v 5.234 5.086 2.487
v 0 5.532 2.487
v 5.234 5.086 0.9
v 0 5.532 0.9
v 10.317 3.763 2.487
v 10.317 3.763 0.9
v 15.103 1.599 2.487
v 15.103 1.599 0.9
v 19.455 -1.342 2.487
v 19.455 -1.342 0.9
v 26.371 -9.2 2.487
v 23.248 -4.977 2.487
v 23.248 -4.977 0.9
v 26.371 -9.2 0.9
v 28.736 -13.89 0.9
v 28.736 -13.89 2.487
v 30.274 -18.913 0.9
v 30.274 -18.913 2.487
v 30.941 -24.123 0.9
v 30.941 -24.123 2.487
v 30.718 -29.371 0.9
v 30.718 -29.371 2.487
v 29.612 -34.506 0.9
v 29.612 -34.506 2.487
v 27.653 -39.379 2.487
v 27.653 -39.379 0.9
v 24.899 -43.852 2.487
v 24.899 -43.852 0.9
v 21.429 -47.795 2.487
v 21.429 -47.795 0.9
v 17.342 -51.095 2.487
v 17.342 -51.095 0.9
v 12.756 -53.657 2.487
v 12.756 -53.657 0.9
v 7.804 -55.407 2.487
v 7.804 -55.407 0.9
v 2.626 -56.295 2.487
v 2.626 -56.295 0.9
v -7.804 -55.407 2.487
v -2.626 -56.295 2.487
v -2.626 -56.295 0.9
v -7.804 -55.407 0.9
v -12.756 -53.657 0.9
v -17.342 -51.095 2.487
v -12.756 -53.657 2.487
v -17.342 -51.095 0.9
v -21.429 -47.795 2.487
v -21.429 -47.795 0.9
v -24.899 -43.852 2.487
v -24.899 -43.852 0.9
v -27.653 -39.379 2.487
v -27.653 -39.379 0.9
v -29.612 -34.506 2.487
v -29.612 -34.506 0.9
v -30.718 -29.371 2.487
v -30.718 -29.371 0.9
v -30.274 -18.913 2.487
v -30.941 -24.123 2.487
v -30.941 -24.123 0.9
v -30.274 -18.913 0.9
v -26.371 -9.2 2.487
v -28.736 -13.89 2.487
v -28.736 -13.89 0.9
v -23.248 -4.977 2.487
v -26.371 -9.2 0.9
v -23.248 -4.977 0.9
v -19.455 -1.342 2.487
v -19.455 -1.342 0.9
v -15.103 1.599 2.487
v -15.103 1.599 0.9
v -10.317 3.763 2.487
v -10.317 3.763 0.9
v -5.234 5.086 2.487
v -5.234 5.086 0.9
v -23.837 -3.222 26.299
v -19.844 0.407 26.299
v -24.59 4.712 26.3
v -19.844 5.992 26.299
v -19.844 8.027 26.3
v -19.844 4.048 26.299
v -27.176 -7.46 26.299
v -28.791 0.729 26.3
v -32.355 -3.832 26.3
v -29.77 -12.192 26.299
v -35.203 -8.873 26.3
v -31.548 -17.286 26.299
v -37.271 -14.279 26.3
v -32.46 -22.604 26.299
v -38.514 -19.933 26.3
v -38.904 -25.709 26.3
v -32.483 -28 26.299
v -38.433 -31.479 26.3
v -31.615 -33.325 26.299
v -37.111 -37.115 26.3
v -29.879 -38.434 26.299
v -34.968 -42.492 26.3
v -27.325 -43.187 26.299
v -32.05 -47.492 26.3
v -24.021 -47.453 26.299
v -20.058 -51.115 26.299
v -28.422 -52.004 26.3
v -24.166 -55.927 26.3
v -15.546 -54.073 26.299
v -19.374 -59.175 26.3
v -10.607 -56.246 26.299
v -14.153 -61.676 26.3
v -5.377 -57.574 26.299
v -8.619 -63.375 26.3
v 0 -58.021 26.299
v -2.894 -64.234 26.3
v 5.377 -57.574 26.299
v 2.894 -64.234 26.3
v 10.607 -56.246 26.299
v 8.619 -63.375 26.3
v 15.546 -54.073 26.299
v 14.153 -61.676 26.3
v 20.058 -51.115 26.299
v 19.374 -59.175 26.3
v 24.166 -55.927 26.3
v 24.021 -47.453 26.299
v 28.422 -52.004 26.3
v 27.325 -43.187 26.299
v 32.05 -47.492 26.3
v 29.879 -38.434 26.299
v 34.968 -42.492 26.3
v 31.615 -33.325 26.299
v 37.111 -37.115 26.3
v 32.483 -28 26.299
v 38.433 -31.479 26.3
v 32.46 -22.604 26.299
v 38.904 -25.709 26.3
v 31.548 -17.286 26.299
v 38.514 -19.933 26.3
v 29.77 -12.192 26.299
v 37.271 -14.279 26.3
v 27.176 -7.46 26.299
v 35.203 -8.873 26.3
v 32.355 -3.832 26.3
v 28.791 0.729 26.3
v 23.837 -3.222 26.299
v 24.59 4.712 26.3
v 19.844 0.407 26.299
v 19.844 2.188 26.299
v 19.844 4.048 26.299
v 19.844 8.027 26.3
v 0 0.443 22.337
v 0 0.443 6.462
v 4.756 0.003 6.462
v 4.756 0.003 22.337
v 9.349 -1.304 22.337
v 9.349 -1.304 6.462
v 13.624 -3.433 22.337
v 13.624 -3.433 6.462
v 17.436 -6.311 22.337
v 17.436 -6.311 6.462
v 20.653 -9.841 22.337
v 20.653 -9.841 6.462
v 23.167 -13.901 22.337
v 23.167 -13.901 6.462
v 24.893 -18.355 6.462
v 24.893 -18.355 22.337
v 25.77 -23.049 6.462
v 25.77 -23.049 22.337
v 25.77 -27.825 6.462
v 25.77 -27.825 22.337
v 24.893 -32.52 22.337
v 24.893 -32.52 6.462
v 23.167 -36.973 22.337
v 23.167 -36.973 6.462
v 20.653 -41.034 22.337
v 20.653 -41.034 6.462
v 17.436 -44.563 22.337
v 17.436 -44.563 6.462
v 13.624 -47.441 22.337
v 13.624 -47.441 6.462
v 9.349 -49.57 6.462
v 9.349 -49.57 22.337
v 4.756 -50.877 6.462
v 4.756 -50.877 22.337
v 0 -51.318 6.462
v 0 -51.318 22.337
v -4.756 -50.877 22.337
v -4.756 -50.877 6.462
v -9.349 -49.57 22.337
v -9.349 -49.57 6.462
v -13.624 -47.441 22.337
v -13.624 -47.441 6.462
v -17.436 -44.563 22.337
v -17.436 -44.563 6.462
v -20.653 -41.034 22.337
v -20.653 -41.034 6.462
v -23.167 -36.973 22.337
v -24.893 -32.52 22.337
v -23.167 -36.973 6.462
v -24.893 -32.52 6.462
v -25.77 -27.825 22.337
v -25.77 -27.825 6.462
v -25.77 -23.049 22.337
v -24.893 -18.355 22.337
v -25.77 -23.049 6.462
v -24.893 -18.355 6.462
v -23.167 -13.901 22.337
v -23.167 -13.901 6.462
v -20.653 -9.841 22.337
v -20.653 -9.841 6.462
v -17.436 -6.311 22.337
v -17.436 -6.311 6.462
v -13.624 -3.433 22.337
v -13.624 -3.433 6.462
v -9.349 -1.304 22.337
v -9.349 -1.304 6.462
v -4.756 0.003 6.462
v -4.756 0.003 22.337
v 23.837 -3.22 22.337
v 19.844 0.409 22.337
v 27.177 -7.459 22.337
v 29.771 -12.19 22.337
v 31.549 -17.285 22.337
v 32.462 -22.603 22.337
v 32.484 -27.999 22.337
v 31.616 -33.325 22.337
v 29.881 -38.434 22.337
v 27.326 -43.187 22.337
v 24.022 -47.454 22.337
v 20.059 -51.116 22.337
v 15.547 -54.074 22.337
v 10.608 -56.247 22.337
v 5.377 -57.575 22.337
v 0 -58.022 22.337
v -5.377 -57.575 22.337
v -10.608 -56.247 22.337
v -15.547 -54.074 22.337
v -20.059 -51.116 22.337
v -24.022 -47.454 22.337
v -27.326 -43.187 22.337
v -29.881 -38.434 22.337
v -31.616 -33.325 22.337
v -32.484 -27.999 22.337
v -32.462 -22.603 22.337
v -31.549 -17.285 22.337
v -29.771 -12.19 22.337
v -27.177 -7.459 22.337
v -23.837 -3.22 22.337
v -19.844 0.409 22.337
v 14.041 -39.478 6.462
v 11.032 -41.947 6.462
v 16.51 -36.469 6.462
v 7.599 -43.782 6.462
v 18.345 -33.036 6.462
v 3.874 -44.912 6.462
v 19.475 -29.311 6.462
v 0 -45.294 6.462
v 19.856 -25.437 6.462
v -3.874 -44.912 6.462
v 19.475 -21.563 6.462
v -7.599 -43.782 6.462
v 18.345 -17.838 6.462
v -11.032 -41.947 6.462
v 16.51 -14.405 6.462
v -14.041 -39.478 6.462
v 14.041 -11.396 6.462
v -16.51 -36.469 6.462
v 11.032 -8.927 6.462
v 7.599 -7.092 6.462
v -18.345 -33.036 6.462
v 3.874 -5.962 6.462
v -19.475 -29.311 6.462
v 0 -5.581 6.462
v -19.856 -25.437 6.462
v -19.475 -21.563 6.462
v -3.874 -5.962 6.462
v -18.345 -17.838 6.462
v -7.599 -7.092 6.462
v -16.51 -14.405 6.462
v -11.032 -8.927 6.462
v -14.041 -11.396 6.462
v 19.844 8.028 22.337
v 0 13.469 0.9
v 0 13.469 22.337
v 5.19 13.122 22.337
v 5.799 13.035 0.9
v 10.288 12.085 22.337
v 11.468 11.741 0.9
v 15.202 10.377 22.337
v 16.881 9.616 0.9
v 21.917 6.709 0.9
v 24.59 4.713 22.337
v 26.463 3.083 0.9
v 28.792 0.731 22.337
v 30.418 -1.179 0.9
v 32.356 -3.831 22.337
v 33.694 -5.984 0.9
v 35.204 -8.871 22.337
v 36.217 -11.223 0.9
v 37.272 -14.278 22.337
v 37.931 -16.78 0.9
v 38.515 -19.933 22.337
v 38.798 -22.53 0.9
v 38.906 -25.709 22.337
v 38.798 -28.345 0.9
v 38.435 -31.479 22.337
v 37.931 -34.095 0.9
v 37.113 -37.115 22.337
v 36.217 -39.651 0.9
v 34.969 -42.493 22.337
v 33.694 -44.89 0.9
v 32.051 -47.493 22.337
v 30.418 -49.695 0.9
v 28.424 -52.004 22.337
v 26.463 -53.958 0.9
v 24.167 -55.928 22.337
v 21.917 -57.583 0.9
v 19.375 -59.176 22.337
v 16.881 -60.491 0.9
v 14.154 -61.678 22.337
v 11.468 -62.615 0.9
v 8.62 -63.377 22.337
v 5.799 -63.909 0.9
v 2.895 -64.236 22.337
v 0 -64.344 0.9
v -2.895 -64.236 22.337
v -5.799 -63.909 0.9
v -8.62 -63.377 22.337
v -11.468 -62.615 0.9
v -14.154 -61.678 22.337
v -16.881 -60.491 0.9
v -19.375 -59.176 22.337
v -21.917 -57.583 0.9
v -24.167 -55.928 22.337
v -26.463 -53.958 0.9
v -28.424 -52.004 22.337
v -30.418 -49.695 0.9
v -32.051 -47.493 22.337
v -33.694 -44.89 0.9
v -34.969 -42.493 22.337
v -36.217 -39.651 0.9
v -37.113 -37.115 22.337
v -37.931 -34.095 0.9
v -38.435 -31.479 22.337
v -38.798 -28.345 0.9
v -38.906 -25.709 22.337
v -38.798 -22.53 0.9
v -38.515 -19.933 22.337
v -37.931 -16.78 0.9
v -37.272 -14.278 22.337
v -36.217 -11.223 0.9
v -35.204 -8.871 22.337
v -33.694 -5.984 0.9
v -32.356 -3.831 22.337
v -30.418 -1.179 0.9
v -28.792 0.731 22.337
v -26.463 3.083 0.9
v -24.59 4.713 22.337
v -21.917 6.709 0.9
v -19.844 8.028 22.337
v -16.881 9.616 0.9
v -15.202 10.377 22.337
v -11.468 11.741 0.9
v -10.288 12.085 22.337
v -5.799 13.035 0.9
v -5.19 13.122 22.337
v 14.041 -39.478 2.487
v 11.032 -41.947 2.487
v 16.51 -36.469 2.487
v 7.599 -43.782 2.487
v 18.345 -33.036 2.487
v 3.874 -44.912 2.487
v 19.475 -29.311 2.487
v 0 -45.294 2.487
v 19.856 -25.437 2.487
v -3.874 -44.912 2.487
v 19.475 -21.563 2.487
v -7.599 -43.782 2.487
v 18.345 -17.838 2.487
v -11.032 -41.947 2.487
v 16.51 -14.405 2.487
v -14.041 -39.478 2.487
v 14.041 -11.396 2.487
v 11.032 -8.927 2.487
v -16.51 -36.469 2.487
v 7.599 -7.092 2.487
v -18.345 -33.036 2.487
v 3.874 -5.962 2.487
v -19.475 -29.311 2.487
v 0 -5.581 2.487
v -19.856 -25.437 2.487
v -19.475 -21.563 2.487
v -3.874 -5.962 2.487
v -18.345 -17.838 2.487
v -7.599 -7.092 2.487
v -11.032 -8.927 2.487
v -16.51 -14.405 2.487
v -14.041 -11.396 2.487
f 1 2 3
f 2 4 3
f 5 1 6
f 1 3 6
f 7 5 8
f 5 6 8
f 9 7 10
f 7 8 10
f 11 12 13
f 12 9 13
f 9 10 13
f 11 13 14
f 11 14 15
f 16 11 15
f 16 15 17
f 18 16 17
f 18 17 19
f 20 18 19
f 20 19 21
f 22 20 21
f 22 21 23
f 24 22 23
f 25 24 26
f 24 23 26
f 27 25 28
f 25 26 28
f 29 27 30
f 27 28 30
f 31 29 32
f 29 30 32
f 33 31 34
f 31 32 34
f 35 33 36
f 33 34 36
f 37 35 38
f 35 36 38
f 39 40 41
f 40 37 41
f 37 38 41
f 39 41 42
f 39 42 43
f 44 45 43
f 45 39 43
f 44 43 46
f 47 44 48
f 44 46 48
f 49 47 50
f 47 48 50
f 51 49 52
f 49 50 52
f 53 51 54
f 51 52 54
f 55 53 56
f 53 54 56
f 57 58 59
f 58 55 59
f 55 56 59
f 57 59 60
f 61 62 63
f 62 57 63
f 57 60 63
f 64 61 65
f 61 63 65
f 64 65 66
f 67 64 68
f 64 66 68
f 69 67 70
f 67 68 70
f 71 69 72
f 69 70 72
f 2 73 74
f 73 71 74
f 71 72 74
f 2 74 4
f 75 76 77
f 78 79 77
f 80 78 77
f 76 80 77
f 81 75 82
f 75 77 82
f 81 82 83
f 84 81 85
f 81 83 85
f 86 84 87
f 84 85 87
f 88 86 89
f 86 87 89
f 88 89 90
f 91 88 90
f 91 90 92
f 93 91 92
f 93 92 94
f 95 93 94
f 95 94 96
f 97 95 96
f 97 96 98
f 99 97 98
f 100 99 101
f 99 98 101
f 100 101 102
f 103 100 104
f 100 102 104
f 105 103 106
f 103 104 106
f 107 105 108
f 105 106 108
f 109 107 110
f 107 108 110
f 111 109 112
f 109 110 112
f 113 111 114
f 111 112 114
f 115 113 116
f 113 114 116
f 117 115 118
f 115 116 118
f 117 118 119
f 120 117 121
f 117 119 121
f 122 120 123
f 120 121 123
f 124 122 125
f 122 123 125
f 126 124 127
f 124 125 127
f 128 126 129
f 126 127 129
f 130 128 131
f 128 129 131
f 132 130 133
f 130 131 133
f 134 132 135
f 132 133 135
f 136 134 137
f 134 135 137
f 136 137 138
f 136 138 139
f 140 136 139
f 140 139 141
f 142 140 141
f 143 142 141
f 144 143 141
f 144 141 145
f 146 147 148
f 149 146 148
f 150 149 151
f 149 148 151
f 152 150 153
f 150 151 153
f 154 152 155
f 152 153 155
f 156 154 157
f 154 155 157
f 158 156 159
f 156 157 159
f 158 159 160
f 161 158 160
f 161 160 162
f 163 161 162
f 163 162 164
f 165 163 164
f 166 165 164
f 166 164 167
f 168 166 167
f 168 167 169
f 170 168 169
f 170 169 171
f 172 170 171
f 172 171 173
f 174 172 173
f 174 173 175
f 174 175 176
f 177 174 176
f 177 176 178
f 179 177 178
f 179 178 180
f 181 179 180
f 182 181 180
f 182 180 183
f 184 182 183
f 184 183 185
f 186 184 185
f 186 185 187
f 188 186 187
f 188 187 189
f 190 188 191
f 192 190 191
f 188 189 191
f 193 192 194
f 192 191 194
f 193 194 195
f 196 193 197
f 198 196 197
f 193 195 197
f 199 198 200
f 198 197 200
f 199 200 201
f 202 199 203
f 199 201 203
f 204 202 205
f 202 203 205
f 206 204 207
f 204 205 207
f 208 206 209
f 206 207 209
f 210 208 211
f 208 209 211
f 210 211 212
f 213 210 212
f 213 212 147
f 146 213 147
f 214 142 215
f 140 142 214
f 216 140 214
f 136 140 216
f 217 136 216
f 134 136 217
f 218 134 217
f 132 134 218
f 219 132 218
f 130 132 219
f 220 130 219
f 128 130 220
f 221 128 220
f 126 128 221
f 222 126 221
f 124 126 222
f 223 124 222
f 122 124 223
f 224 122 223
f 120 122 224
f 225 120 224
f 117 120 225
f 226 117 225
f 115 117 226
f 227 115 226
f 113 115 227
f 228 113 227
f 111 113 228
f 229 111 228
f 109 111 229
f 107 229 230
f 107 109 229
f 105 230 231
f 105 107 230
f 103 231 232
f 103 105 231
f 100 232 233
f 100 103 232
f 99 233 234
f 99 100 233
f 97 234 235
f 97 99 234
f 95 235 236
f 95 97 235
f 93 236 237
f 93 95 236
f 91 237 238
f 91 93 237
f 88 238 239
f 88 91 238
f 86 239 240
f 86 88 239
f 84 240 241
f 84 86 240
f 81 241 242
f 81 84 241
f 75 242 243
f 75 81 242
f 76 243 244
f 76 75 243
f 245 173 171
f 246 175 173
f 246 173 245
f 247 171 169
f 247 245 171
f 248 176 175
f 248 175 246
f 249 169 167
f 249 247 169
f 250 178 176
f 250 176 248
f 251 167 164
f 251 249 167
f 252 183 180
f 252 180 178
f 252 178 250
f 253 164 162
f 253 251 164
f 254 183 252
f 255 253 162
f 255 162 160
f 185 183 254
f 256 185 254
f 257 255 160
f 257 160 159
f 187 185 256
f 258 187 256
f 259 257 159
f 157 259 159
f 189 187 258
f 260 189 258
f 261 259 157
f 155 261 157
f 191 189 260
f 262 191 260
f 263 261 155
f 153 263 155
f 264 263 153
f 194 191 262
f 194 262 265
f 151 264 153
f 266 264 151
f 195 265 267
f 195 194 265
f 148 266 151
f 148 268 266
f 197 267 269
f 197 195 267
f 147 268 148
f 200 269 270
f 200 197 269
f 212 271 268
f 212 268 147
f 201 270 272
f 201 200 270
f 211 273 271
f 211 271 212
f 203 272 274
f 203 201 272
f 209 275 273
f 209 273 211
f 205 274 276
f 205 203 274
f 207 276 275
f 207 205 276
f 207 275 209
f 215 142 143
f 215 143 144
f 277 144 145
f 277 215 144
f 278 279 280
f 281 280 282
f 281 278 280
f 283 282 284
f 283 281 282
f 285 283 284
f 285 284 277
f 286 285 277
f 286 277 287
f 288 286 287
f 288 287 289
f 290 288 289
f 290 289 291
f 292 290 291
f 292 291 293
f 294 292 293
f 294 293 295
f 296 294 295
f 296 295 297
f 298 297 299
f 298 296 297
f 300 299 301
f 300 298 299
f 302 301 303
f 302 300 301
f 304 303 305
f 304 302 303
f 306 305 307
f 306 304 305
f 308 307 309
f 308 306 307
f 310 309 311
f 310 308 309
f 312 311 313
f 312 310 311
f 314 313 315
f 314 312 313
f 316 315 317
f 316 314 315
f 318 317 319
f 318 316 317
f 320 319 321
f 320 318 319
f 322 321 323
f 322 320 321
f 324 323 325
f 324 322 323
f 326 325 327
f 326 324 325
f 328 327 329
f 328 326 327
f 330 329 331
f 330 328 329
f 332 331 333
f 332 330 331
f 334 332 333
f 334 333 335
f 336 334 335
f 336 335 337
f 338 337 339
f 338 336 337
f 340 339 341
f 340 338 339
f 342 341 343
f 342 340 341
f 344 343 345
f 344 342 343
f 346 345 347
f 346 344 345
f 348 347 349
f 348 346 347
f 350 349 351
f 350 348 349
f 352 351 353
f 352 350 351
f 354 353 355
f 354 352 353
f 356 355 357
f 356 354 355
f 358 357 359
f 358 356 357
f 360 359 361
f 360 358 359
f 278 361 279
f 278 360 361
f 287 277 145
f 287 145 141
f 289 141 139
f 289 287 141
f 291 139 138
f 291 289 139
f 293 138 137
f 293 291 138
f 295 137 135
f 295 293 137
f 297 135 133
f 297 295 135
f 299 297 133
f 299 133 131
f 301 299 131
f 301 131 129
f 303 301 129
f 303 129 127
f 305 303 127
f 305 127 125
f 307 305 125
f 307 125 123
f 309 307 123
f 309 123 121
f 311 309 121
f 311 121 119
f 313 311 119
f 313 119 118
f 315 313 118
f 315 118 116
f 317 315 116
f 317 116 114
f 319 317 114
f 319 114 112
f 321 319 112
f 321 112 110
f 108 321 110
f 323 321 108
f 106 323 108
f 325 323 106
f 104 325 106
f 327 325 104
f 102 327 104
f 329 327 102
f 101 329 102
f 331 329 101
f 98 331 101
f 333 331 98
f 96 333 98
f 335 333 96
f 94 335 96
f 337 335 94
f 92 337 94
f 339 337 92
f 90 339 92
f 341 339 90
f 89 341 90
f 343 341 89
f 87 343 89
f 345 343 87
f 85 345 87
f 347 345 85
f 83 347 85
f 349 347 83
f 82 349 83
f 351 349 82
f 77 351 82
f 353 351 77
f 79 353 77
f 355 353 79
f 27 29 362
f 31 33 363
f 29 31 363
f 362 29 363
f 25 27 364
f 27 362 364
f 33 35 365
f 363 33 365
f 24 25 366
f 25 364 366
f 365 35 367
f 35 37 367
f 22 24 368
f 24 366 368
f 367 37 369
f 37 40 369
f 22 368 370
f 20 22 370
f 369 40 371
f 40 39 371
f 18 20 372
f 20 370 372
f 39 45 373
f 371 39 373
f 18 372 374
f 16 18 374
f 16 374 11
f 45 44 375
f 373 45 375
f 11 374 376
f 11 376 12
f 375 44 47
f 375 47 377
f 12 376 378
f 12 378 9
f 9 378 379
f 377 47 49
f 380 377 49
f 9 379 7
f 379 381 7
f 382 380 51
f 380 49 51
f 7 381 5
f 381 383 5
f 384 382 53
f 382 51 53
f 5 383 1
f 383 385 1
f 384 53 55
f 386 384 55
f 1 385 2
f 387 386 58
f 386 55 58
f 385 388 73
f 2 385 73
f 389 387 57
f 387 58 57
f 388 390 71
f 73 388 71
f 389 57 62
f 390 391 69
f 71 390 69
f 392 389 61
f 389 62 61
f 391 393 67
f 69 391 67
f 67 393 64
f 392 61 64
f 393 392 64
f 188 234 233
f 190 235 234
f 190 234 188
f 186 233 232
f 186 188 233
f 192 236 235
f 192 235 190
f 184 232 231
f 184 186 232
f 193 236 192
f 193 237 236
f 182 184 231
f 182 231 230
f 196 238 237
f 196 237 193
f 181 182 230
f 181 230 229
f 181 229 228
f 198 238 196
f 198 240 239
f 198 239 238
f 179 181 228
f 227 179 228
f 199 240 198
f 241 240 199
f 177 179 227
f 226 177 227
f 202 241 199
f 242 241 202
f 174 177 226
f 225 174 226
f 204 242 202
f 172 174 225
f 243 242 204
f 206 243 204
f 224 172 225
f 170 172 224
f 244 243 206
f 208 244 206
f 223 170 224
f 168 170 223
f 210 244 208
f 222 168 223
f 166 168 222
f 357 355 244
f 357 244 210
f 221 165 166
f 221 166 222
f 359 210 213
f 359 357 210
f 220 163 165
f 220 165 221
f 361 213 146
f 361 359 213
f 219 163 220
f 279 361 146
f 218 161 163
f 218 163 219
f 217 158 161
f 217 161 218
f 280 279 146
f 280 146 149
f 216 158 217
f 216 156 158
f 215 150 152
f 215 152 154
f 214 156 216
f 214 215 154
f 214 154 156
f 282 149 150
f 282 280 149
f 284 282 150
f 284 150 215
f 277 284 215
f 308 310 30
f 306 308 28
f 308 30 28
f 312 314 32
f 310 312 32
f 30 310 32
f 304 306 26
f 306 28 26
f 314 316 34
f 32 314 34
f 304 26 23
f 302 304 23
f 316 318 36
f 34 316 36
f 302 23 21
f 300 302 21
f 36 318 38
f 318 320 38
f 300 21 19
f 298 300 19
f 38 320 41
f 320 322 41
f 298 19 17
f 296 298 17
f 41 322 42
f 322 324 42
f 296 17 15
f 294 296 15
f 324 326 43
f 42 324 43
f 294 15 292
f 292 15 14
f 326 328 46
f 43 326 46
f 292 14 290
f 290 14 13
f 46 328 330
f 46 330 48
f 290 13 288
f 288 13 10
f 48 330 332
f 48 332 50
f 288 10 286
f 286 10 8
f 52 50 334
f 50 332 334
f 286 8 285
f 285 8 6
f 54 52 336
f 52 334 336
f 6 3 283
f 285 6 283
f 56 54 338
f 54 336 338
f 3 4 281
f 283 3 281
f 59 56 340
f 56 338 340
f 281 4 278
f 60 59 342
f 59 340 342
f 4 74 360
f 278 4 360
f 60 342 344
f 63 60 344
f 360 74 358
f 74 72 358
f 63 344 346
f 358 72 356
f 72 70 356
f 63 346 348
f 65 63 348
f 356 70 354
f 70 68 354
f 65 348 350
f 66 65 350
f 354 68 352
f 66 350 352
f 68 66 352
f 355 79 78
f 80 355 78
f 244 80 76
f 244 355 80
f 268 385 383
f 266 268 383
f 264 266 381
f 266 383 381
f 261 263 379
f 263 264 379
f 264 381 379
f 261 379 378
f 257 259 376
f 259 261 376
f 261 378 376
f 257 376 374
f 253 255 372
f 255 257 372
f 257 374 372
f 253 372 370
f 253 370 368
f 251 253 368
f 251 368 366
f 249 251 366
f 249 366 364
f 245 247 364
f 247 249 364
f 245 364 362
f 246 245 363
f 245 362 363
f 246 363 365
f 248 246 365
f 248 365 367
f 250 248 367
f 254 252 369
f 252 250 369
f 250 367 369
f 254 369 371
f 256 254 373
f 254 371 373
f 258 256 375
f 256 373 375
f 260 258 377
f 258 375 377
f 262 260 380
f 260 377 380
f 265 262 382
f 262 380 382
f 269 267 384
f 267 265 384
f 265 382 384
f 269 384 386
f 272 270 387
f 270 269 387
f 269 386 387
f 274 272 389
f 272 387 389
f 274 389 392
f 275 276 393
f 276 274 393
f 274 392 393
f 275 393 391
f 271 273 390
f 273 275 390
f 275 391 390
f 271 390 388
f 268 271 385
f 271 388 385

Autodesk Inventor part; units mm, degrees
ref_plane "YZ Plane" through (0, 0, 0) normal (1, 0, 0) x (0, 1, 0)
ref_plane "XZ Plane" through (0, 0, 0) normal (0, 1, 0) x (-1, 0, 0)
ref_plane "XY Plane" through (0, 0, 0) normal (0, 0, 1) x (1, 0, 0)
sketch "Sketch1" plane through (0, 0, 0) normal (1, 0, 0) x (0, 1, 0)
  line L0 (7.148, 22.3374) -> (0.4434, 22.3374)
  line L1 (0.4434, 22.3374) -> (0.4434, 6.4624)
  line L2 (0.4434, 6.4624) -> (-5.5806, 6.4624)
  line L3 (-5.5806, 6.4624) -> (-5.5806, 2.4873)
  line L4 (-5.5806, 2.4873) -> (5.5319, 2.4873)
  line L5 (5.5319, 2.4873) -> (5.5319, 0.8998)
  line L6 (5.5319, 0.8998) -> (13.4694, 0.8998)
  line L7 (7.148, 22.3374) -> (7.1466, 26.2987)
  line L8 (7.1466, 26.2987) -> (13.468, 26.2998)
  line L9 (13.468, 26.2998) -> (13.4694, 22.3374)
  line L10 (13.4694, 22.3374) -> (13.4694, 0.8998)
  line L11 (13.4694, 0.8998) -> (-25.4371, 0.8998) construction
  line L12 (-25.4371, 0.8998) -> (-25.4371, 30.7501)
  line L13 (7.148, 22.3374) -> (13.4694, 22.3374)
  point P0 (0, 0)
  dimension "d7" = 19.05
  dimension "d8" = 7.9375
  dimension "d9" = 5.5626
  dimension "d10" = 1.5875
  dimension "d11" = 25.4
  dimension "d12" = 21.4376
  dimension "d13" = 38.9064
revolve "Revolution1" add sketch "Sketch1" angle 360 about axis through (0, -25.4371, 0.8998) along (0, 0, 1) contours L13 L10 L6 L5 L4 L3 L2 L1 L0
revolve "Revolution2" add sketch "Sketch1" angle 360 about axis through (0, -25.4371, 0.8998) along (0, 0, -1) contours L7 L8 L9 L13
sketch "Sketch3" plane through (0, -25.4371, 22.3374) normal (0, 0, 1) x (1, 0, 0)
  line L0 (0, 49.6302) -> (19.8438, 49.6302)
  line L1 (19.8438, 49.6302) -> (-19.8438, 49.6302)
  line L2 (-19.8438, 49.6302) -> (-19.8438, 12.1467)
  line L3 (-19.8438, 12.1467) -> (19.8438, 12.1467)
  line L4 (19.8438, 12.1467) -> (19.8438, 49.6302)
  point P0 (0, 25.4371)
  dimension "d18" = 19.8438
  dimension "d19" = 39.6875
extrude "Extrusion1" cut sketch "Sketch3" along normal blind 15.875
properties part number "Lower die 2 oweder ring"
